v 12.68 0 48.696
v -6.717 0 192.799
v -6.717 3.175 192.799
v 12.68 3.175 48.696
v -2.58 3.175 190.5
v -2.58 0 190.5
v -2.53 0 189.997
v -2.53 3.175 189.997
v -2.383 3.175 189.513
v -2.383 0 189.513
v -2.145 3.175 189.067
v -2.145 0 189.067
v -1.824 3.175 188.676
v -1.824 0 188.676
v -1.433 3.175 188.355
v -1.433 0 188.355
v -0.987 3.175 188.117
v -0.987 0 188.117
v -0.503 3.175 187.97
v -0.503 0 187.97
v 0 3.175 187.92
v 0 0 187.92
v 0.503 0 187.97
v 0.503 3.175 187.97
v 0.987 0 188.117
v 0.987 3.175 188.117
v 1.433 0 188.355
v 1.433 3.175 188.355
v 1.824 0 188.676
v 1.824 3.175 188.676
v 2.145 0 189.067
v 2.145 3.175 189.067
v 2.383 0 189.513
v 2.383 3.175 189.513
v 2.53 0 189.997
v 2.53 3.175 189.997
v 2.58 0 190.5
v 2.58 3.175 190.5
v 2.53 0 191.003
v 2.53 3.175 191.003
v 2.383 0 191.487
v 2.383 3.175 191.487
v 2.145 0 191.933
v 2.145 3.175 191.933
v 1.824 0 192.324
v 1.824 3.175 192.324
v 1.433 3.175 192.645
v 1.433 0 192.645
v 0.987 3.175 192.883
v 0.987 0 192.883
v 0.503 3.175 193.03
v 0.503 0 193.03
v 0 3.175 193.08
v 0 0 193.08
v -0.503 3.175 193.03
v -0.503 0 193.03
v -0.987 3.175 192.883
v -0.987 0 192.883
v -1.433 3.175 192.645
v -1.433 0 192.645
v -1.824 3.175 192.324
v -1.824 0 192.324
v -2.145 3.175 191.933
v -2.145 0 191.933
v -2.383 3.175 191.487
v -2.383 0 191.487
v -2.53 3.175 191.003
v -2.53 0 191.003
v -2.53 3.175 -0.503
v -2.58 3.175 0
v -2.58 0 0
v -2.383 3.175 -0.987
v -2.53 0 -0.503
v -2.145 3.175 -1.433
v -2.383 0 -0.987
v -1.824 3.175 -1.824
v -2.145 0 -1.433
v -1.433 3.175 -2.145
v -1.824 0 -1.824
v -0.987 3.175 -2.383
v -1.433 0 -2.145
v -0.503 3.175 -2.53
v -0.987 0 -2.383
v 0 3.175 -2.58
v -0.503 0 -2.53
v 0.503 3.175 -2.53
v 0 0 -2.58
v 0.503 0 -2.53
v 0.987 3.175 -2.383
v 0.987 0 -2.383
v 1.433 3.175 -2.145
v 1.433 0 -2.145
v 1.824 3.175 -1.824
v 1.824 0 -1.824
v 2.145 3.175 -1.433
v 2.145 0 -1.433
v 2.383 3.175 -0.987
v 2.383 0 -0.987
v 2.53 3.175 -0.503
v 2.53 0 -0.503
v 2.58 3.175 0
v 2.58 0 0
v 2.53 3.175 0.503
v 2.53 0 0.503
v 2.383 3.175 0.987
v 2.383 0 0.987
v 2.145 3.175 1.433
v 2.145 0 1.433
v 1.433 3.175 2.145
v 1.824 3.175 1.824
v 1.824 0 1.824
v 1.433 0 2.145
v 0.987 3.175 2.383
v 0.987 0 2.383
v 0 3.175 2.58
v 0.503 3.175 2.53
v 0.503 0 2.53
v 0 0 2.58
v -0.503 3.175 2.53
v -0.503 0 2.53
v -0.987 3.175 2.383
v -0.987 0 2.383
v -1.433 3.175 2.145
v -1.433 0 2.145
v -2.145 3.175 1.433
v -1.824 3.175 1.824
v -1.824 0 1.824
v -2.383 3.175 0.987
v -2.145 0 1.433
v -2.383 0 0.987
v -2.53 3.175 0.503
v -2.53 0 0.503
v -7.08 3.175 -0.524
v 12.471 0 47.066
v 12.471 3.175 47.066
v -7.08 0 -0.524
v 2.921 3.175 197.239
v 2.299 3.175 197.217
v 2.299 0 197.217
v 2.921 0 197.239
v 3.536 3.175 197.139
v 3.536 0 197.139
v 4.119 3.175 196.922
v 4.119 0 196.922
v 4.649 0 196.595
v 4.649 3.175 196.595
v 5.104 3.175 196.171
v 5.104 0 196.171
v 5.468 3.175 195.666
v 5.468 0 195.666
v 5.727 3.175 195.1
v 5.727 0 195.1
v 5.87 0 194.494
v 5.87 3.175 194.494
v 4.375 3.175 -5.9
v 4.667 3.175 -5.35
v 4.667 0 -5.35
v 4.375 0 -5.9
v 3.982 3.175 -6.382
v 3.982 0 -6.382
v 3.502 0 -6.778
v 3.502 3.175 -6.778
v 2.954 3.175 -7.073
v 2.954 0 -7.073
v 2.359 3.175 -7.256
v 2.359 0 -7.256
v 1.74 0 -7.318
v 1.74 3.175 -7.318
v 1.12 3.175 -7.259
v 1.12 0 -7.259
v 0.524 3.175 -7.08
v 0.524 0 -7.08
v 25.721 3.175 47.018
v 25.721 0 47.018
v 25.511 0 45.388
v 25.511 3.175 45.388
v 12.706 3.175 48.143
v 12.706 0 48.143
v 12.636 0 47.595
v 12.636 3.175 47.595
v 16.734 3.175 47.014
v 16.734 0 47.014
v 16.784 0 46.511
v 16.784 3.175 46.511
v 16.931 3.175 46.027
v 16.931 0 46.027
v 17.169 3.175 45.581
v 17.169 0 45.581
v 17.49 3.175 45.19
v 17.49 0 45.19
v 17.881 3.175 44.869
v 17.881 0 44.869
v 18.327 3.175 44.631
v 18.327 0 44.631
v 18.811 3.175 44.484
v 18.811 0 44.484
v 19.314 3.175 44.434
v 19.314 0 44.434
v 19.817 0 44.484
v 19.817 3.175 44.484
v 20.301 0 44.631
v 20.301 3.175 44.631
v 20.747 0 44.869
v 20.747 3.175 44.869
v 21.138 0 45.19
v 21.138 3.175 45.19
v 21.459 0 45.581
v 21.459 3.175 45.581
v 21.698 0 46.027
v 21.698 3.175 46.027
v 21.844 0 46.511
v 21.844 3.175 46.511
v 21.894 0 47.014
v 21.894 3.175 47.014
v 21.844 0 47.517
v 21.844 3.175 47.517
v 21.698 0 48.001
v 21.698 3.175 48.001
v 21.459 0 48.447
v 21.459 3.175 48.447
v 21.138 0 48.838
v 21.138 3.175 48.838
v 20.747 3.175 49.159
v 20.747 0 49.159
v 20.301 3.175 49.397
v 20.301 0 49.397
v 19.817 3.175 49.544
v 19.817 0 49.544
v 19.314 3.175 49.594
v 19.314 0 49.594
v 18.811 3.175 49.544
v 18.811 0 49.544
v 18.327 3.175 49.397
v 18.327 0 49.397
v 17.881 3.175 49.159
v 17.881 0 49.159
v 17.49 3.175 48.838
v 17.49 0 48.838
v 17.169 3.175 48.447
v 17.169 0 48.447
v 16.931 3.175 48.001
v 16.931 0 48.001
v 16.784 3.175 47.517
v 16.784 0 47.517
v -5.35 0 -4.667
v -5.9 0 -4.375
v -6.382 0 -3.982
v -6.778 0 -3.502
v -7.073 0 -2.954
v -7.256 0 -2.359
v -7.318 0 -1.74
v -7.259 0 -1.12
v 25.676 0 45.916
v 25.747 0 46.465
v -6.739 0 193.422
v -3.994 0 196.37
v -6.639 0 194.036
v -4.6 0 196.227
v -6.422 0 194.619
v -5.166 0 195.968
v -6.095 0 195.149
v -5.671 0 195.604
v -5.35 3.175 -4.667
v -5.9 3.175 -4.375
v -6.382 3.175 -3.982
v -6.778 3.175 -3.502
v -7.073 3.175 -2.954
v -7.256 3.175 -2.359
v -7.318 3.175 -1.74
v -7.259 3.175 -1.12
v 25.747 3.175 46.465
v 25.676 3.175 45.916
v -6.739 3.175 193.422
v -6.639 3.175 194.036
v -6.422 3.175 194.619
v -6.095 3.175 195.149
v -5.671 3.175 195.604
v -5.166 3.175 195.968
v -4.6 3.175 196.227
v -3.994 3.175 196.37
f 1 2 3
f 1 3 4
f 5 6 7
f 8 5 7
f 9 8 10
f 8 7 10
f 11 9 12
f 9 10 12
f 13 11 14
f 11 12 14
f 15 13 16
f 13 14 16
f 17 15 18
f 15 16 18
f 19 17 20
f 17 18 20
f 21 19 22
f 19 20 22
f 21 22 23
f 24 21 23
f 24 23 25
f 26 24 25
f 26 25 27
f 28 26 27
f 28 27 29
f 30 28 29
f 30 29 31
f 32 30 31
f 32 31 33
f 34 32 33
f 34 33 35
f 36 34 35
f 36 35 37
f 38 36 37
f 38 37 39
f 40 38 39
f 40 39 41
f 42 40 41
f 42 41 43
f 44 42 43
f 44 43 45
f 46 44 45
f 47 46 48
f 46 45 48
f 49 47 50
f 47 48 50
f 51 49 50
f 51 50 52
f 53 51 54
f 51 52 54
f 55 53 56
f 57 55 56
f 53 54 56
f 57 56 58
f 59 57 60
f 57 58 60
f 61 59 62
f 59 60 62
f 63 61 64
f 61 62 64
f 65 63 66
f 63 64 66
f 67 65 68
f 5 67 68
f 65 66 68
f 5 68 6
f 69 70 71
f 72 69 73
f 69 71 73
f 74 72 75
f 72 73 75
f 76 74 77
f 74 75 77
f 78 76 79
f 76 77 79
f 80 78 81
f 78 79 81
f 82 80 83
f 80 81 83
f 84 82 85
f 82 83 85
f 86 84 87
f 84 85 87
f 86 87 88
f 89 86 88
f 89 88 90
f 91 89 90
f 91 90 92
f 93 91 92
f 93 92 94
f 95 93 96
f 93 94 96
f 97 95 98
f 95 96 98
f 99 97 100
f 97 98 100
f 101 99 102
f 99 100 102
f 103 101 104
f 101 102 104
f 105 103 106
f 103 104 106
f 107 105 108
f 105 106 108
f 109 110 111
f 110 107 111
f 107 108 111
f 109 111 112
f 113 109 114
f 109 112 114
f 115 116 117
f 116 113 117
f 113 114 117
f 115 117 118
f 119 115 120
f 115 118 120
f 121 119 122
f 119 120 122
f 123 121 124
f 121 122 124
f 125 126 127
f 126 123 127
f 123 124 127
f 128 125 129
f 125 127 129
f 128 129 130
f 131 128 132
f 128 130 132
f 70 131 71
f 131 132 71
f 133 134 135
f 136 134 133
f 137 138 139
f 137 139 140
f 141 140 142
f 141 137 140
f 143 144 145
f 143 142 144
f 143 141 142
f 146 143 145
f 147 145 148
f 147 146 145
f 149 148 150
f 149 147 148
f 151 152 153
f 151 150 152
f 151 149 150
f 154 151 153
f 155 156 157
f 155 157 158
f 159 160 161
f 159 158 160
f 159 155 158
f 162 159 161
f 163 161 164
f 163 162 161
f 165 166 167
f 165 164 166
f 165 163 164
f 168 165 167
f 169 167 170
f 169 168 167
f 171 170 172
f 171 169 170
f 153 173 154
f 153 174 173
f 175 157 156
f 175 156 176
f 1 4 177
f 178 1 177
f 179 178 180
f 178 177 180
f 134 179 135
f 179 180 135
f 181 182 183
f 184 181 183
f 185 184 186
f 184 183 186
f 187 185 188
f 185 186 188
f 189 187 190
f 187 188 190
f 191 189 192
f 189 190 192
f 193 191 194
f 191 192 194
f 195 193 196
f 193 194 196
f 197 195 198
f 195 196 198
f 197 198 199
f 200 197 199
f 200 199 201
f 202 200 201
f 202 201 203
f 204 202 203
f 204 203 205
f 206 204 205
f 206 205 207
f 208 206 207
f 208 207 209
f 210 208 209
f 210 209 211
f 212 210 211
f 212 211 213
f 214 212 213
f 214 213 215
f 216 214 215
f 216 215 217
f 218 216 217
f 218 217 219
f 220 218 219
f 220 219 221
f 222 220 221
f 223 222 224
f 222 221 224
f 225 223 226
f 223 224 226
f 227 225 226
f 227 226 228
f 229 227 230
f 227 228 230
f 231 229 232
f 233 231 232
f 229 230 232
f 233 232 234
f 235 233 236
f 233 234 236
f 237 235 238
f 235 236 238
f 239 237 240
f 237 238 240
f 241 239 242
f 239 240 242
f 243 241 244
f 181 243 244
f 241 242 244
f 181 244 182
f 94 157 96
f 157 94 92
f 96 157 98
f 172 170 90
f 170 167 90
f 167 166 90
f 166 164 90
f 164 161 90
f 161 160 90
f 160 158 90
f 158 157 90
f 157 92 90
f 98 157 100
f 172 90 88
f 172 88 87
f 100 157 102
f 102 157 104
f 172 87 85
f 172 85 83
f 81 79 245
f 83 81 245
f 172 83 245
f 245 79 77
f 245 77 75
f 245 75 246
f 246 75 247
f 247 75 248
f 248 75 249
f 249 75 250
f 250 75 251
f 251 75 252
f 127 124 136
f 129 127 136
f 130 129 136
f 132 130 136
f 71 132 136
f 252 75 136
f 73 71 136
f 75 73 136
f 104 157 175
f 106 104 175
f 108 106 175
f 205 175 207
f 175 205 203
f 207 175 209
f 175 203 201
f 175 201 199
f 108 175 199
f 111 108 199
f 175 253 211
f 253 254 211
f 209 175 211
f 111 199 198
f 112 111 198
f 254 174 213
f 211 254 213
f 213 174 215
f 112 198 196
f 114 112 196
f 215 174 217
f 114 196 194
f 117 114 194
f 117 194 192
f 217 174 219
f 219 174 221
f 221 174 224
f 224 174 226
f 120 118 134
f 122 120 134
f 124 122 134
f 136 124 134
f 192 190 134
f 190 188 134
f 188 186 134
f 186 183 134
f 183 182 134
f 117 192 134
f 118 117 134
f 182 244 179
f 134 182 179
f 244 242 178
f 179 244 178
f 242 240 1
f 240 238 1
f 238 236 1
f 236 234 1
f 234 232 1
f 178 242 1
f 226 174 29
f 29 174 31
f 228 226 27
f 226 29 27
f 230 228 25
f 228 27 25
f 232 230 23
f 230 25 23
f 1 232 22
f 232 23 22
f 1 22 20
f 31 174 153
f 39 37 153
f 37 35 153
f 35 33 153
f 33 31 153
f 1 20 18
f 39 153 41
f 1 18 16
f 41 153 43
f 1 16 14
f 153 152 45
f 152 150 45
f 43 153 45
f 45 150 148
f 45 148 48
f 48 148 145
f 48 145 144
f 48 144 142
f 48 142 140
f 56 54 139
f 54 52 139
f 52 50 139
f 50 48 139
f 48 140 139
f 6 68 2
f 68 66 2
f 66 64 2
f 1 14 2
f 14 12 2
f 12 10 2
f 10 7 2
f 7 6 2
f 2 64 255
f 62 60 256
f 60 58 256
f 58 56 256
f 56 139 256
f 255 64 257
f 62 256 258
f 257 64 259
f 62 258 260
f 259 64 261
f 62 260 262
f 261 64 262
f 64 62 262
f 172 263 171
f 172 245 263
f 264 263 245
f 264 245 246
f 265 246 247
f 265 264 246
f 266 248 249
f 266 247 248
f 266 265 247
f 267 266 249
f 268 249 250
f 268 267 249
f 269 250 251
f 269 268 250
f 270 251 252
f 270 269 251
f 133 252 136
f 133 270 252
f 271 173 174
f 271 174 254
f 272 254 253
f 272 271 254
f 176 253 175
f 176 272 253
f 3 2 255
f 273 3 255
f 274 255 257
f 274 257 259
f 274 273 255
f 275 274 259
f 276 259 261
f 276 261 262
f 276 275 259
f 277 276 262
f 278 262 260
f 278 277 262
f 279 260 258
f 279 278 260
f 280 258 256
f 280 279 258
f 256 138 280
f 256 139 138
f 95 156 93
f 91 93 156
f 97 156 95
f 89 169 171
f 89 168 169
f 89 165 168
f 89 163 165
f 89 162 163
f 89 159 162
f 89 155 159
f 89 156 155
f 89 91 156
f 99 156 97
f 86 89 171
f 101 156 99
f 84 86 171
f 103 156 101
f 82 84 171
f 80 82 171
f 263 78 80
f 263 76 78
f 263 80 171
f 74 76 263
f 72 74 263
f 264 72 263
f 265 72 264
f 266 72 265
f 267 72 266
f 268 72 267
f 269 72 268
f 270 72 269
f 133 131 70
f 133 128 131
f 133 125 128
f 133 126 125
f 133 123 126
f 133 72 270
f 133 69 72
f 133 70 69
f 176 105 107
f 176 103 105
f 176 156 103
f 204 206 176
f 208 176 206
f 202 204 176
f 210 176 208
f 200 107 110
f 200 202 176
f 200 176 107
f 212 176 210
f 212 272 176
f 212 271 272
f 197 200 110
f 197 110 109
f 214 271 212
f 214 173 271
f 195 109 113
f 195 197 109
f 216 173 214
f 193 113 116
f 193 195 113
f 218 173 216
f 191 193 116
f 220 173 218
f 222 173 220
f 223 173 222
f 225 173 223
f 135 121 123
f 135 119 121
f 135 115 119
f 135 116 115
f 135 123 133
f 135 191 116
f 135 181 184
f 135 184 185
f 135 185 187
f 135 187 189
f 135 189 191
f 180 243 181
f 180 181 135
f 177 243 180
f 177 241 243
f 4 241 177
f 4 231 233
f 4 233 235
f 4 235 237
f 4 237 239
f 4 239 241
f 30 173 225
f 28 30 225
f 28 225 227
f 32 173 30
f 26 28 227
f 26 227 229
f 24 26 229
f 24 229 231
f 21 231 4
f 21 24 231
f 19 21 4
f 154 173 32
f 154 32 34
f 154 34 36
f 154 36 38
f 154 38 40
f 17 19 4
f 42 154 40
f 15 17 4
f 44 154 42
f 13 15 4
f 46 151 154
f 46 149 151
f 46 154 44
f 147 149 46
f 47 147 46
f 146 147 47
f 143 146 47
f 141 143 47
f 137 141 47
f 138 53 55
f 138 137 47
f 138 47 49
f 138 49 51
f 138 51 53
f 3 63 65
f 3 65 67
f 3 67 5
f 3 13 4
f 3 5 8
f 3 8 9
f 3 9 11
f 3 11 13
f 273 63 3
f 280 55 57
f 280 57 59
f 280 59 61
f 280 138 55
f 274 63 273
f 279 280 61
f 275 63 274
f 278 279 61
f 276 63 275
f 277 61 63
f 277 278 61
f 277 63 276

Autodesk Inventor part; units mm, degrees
ref_plane "YZ Plane" through (0, 0, 0) normal (1, 0, 0) x (0, 1, 0)
ref_plane "XZ Plane" through (0, 0, 0) normal (0, 1, 0) x (-1, 0, 0)
ref_plane "XY Plane" through (0, 0, 0) normal (0, 0, 1) x (1, 0, 0)
sketch "Sketch1" plane through (0, 0, 0) normal (0, 1, 0) x (-1, 0, 0)
  line L0 (0, 0) -> (0, 190.5)
  line L1 (0, 190.5) -> (-19.3142, 47.0141)
  line L2 (-19.3142, 47.0141) -> (0, 0)
  line L3 (8.2867, -3.4607) -> (-3.4607, -8.2867)
  line L4 (-3.4607, -8.2867) -> (-25.8344, 46.1749)
  line L5 (-25.8344, 46.1749) -> (-14.0871, 51.0009)
  line L6 (-14.0871, 51.0009) -> (8.2867, -3.4607)
  line L7 (-5.4461, 197.6404) -> (7.1404, 195.9461)
  line L8 (7.1404, 195.9461) -> (-13.2479, 44.4807)
  line L9 (-13.2479, 44.4807) -> (-25.8344, 46.1749)
  line L10 (-25.8344, 46.1749) -> (-5.4461, 197.6404)
  circle A0 centre (0, 0) radius 2.5797
  circle A1 centre (-19.3142, 47.0141) radius 2.5797
  circle A2 centre (0, 190.5) radius 2.5797
  point P0 (0.8471, 196.7932)
  point P1 (2.413, -5.8737)
  point P2 (-12.7939, 47.8532)
  dimension "d0" = 150
  dimension "d1" = 190.5
  dimension "d2" = 144.78
  dimension "d3" = 12.7
  dimension "d4" = 5.1594
  dimension "d5" = 6.35
  dimension "d6" = 6.35
extrude "Extrusion1" add sketch "Sketch1" along normal blind 3.175 contours A0 L2 A1 L9 L8 L6 L0 | L0 L6 L3 L4 L9 A1 L2 A0 | L8 L6 L5 A1 L1 A2 L0 | L0 A2 L1 A1 L5 L10 L7 L8 | L8 L9 A1 L5 L6 | L9 L5 A1
fillet "Fillet1" radius 3.175 6 edges at (-7.1404, 1.5875, 195.9461) (5.4461, 1.5875, 197.6404) (25.8344, 1.5875, 46.1749) (12.7939, 1.5875, 47.8532) (3.4607, 1.5875, -8.2867) (-8.2867, 1.5875, -3.4607)
properties part number "PB OUT"
